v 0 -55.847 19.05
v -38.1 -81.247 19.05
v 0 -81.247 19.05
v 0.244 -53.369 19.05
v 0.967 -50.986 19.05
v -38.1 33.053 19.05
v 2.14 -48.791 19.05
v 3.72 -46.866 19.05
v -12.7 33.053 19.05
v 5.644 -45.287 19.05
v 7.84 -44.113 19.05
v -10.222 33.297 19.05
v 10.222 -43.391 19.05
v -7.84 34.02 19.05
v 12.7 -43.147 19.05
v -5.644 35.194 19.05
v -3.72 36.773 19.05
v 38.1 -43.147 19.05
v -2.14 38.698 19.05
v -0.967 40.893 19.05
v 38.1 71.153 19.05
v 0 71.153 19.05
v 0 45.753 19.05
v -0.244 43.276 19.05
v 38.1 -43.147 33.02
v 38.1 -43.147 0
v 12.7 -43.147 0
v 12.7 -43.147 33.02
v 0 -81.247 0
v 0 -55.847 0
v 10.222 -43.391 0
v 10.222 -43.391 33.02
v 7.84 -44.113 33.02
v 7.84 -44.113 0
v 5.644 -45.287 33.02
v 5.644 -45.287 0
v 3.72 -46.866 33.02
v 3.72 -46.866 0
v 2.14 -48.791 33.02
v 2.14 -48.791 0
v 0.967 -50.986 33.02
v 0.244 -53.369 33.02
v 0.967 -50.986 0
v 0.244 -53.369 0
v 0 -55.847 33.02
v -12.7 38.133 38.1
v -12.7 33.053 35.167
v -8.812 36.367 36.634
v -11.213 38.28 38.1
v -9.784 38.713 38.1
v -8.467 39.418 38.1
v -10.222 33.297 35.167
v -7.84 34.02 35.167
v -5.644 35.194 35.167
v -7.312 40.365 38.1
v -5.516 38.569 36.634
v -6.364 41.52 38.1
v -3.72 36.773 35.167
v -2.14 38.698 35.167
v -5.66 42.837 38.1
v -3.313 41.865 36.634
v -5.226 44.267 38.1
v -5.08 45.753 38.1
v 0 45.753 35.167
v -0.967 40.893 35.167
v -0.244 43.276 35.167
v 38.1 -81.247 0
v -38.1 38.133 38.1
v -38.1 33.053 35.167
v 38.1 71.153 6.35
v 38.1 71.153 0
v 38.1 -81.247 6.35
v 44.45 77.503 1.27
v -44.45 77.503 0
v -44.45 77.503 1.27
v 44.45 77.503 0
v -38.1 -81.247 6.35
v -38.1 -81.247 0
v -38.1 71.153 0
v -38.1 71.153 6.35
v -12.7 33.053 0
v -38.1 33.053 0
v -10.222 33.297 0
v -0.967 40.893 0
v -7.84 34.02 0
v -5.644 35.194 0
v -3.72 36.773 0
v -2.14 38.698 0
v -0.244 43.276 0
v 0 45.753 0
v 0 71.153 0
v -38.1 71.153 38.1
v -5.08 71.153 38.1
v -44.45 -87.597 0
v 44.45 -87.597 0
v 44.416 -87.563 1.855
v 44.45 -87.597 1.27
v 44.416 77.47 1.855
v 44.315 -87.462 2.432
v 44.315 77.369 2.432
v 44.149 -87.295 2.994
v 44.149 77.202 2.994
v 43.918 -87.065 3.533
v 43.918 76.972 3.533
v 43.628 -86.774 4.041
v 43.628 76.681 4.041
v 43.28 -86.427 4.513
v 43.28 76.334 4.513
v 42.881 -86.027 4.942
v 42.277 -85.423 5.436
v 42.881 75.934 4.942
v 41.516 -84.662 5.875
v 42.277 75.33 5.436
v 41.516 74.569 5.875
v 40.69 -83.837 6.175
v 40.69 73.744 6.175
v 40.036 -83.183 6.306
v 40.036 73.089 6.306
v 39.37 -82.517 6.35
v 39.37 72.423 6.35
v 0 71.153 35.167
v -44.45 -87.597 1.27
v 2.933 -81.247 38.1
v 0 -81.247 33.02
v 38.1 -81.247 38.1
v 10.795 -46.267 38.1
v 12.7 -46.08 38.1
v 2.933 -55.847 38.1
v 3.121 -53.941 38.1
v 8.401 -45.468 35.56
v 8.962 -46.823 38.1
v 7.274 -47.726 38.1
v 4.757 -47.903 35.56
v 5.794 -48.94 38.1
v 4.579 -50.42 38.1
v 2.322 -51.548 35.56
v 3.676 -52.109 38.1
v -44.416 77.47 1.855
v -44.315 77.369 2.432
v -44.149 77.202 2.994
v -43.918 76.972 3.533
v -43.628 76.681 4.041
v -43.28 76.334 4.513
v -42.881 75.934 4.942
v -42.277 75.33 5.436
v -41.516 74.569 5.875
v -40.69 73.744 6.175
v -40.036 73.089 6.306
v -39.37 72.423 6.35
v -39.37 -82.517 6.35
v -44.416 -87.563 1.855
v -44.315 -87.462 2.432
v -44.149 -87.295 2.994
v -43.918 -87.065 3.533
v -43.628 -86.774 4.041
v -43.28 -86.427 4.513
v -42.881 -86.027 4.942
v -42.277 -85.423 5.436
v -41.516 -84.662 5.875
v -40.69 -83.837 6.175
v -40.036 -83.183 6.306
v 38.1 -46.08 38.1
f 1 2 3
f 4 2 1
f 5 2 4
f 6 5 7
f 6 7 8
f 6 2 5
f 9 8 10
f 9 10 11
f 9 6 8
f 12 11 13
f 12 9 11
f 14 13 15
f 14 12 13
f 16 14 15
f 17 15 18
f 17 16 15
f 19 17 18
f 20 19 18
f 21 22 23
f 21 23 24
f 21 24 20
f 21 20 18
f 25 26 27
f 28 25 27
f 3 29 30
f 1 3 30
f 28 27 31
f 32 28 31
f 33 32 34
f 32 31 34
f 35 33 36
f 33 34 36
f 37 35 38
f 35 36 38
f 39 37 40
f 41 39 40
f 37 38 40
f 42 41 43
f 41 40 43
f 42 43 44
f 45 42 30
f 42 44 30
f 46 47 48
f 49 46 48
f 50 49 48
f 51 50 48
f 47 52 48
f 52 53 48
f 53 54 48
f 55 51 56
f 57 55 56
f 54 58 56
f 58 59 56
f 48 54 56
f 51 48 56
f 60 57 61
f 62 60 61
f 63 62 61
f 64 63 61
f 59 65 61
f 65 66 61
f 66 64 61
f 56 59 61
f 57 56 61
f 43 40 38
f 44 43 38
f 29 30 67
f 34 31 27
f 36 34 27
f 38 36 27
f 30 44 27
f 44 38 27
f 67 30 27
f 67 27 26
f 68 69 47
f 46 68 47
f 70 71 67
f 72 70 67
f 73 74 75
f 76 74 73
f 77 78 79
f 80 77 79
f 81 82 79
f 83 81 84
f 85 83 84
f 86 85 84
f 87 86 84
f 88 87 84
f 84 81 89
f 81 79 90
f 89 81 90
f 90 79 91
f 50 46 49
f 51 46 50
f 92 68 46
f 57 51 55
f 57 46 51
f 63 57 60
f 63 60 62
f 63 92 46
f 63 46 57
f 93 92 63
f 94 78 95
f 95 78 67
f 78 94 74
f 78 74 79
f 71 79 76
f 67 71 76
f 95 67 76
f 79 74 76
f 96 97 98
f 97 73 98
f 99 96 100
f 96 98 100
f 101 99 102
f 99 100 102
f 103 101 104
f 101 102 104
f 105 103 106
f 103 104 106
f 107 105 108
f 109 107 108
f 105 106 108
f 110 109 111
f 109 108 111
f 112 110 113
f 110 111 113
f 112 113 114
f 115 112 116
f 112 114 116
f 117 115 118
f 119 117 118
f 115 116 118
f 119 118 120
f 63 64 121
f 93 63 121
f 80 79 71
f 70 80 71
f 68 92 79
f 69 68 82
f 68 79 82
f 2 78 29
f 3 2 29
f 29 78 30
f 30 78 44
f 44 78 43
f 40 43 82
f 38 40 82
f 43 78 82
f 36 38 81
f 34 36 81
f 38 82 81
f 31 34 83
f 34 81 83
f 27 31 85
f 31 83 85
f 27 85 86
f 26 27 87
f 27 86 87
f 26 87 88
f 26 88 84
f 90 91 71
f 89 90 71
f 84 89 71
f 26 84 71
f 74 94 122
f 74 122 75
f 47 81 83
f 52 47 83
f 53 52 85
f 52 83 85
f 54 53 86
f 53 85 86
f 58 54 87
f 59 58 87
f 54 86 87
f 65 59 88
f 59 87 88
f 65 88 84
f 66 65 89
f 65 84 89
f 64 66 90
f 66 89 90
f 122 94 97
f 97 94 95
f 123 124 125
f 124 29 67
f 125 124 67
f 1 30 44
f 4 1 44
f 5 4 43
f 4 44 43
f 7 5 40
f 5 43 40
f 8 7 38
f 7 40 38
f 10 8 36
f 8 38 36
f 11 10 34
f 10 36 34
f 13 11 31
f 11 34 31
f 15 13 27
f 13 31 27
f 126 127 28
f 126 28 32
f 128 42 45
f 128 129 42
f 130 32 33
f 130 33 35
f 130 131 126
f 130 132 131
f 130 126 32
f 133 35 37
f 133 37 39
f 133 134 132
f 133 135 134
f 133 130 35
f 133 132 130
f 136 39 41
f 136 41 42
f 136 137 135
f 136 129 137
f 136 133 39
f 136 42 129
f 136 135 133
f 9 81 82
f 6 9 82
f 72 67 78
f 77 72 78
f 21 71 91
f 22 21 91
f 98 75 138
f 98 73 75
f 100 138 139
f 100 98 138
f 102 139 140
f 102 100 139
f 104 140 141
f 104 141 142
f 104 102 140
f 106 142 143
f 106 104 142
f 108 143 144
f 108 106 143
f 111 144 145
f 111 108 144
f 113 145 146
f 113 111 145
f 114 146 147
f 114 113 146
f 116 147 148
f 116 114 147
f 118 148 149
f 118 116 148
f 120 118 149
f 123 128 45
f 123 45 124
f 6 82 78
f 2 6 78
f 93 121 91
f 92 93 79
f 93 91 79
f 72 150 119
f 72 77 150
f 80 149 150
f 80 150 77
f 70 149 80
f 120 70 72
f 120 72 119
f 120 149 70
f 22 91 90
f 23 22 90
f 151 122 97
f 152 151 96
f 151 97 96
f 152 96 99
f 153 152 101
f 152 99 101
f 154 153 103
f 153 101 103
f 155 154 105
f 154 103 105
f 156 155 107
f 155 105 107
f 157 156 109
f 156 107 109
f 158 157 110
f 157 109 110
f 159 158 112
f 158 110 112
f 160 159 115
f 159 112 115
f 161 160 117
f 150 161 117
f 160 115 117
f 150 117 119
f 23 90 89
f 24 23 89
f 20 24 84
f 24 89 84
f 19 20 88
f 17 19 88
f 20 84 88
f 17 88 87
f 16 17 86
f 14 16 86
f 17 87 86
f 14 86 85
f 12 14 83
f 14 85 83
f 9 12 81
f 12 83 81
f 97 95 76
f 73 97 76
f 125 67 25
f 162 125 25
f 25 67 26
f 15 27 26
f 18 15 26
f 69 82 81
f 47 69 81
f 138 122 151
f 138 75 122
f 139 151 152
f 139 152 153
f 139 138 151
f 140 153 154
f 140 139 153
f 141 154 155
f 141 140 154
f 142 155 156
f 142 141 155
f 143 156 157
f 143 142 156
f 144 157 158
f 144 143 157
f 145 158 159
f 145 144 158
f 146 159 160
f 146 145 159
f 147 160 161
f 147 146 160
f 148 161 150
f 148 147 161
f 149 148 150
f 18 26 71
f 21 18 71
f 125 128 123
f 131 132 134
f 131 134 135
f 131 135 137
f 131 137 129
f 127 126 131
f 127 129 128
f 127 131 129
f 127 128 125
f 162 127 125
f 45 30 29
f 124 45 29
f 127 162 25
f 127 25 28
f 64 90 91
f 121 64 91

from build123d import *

# Parameters (mm, degrees)
F1_DEPTH = 38.1
F2_DEPTH = 19.05
F0_W     = 88.9
F0_H     = 165.1
F3_DEPTH = 6.35
F4_SIZE2 = 2.9329393675
F4_SIZE  = 5.08
F5_SIZE2 = 2.9329393675
F5_SIZE  = 5.08
F6_R     = 5.08


with BuildPart() as f1:
    # F0 (on Top) → F1 (new body)
    with BuildSketch(Plane.XY):
        with BuildLine():
            Line((0, 45.7534222543), (0, 71.1534222543))
            Line((0, 71.1534222543), (-38.1, 71.1534222543))
            Line((-38.1, 71.1534222543), (-38.1, 33.0534222543))
            Line((-38.1, 33.0534222543), (-12.7, 33.0534222543))
            ThreePointArc((-12.7, 33.0534222543), (-3.7197438789, 36.7731661333), (0, 45.7534222543))
        make_face()
    extrude(amount=F1_DEPTH)

    # F5
    f5_edges = [f1.edges().sort_by_distance(p)[0] for p in [
        (-25.4, 33.053422, 38.1),
    ]]
    f5_side = f1.faces().sort_by_distance((-19.446042, 52.499464, 38.1))[0]
    chamfer(f5_edges, length=F5_SIZE, length2=F5_SIZE2, reference=f5_side)


with BuildPart() as f1b:
    # F0 (on Top) → F1, piece 2 (new body)
    with BuildSketch(Plane.XY):
        with BuildLine():
            Line((38.1, -81.2465777457), (38.1, -43.1465777457))
            Line((38.1, -43.1465777457), (12.7, -43.1465777457))
            ThreePointArc((12.7, -43.1465777457), (3.7197438789, -46.8663216246), (0, -55.8465777457))
            Line((0, -55.8465777457), (0, -81.2465777457))
            Line((0, -81.2465777457), (38.1, -81.2465777457))
        make_face()
    extrude(amount=F1_DEPTH)

    # F4
    f4_edges = [f1b.edges().sort_by_distance(p)[0] for p in [
        (0, -68.546578, 38.1),
    ]]
    f4_side = f1b.faces().sort_by_distance((0, -68.546578, 19.05))[0]
    chamfer(f4_edges, length=F4_SIZE, length2=F4_SIZE2, reference=f4_side)


with BuildPart() as f2:
    # F0 (on Top) → F2 (new body)
    with BuildSketch(Plane.XY):
        with BuildLine():
            Line((38.1, -43.1465777457), (38.1, 71.1534222543))
            Line((38.1, 71.1534222543), (0, 71.1534222543))
            Line((0, 71.1534222543), (0, 45.7534222543))
            ThreePointArc((0, 45.7534222543), (-3.7197438789, 36.7731661333), (-12.7, 33.0534222543))
            Line((-12.7, 33.0534222543), (-38.1, 33.0534222543))
            Line((-38.1, 33.0534222543), (-38.1, -81.2465777457))
            Line((-38.1, -81.2465777457), (0, -81.2465777457))
            Line((0, -81.2465777457), (0, -55.8465777457))
            ThreePointArc((0, -55.8465777457), (3.7197438789, -46.8663216246), (12.7, -43.1465777457))
            Line((12.7, -43.1465777457), (38.1, -43.1465777457))
        make_face()
    extrude(amount=F2_DEPTH)


with BuildPart() as f3:
    # F0 (on Top) → F3 (new body)
    with BuildSketch(Plane.XY):
        with Locations((0, -5.0465777457)):
            Rectangle(F0_W, F0_H)
        Polygon((0, 71.1534222543), (38.1, 71.1534222543), (38.1, -43.1465777457), (38.1, -81.2465777457), (0, -81.2465777457), (-38.1, -81.2465777457), (-38.1, 33.0534222543), (-38.1, 71.1534222543), align=None, mode=Mode.SUBTRACT)
    extrude(amount=F3_DEPTH)

    # F6
    f6_edges = [f3.edges().sort_by_distance(p)[0] for p in [
        (0, -87.596578, 6.35),
        (-44.45, -5.046578, 6.35),
        (44.45, -5.046578, 6.35),
        (0, 77.503422, 6.35),
    ]]
    fillet(f6_edges, radius=F6_R)


solid = Compound([f1.part, f1b.part, f2.part, f3.part])
